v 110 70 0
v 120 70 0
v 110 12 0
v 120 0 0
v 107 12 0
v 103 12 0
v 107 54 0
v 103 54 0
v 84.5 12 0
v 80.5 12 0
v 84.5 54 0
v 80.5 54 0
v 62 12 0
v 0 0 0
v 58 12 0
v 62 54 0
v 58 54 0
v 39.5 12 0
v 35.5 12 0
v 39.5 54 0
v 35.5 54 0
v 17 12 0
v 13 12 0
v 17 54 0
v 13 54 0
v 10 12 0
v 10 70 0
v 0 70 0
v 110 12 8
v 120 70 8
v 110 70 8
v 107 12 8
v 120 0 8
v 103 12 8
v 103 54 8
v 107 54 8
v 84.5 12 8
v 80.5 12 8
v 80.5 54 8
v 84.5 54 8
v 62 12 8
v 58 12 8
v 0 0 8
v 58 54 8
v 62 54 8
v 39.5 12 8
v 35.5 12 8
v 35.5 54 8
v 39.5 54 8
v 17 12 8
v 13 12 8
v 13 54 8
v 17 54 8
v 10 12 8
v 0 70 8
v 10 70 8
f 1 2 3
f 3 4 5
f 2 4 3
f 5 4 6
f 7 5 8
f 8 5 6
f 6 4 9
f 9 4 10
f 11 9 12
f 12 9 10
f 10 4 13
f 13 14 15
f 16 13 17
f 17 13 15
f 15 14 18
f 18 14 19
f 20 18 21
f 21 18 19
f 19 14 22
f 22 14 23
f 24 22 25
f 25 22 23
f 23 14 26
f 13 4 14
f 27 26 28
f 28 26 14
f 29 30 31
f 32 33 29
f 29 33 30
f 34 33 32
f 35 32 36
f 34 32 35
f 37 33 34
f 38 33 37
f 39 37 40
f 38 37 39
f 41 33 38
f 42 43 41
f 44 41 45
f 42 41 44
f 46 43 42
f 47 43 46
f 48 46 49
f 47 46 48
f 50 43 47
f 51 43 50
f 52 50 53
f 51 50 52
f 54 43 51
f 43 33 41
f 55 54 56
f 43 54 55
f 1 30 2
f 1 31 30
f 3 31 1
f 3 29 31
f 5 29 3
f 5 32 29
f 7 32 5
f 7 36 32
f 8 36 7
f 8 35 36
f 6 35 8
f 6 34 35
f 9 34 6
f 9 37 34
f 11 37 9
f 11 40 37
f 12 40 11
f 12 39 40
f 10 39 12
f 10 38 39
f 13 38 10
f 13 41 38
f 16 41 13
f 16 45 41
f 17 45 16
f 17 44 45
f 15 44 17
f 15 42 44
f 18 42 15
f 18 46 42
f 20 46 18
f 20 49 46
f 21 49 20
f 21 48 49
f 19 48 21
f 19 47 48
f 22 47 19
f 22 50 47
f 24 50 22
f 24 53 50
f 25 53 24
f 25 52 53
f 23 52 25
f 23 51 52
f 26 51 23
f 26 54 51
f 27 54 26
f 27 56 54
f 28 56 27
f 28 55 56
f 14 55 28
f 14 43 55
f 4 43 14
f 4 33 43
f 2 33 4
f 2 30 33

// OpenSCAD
$fn = 32;

// ----------------------------------------------------------------------
// Guard grille: 5 slats over a 120 x 70 mm plate
// ----------------------------------------------------------------------

// --- parameters (mm) ---
profile_height = 8;       // extrusion height
profile_points = 28;      // points of the closed outline

profile = [[0, 0], [120, 0], [120, 70], [110, 70], [110, 12], [107, 12], [107, 54], [103, 54], [103, 12], [84.5, 12], [84.5, 54], [80.5, 54], [80.5, 12], [62, 12], [62, 54], [58, 54], [58, 12], [39.5, 12], [39.5, 54], [35.5, 54], [35.5, 12], [17, 12], [17, 54], [13, 54], [13, 12], [10, 12], [10, 70], [0, 70]];  // single closed polygon, 28 points, counter clockwise

// --- the one profile operation ---
linear_extrude(height = profile_height) polygon(points = profile);
